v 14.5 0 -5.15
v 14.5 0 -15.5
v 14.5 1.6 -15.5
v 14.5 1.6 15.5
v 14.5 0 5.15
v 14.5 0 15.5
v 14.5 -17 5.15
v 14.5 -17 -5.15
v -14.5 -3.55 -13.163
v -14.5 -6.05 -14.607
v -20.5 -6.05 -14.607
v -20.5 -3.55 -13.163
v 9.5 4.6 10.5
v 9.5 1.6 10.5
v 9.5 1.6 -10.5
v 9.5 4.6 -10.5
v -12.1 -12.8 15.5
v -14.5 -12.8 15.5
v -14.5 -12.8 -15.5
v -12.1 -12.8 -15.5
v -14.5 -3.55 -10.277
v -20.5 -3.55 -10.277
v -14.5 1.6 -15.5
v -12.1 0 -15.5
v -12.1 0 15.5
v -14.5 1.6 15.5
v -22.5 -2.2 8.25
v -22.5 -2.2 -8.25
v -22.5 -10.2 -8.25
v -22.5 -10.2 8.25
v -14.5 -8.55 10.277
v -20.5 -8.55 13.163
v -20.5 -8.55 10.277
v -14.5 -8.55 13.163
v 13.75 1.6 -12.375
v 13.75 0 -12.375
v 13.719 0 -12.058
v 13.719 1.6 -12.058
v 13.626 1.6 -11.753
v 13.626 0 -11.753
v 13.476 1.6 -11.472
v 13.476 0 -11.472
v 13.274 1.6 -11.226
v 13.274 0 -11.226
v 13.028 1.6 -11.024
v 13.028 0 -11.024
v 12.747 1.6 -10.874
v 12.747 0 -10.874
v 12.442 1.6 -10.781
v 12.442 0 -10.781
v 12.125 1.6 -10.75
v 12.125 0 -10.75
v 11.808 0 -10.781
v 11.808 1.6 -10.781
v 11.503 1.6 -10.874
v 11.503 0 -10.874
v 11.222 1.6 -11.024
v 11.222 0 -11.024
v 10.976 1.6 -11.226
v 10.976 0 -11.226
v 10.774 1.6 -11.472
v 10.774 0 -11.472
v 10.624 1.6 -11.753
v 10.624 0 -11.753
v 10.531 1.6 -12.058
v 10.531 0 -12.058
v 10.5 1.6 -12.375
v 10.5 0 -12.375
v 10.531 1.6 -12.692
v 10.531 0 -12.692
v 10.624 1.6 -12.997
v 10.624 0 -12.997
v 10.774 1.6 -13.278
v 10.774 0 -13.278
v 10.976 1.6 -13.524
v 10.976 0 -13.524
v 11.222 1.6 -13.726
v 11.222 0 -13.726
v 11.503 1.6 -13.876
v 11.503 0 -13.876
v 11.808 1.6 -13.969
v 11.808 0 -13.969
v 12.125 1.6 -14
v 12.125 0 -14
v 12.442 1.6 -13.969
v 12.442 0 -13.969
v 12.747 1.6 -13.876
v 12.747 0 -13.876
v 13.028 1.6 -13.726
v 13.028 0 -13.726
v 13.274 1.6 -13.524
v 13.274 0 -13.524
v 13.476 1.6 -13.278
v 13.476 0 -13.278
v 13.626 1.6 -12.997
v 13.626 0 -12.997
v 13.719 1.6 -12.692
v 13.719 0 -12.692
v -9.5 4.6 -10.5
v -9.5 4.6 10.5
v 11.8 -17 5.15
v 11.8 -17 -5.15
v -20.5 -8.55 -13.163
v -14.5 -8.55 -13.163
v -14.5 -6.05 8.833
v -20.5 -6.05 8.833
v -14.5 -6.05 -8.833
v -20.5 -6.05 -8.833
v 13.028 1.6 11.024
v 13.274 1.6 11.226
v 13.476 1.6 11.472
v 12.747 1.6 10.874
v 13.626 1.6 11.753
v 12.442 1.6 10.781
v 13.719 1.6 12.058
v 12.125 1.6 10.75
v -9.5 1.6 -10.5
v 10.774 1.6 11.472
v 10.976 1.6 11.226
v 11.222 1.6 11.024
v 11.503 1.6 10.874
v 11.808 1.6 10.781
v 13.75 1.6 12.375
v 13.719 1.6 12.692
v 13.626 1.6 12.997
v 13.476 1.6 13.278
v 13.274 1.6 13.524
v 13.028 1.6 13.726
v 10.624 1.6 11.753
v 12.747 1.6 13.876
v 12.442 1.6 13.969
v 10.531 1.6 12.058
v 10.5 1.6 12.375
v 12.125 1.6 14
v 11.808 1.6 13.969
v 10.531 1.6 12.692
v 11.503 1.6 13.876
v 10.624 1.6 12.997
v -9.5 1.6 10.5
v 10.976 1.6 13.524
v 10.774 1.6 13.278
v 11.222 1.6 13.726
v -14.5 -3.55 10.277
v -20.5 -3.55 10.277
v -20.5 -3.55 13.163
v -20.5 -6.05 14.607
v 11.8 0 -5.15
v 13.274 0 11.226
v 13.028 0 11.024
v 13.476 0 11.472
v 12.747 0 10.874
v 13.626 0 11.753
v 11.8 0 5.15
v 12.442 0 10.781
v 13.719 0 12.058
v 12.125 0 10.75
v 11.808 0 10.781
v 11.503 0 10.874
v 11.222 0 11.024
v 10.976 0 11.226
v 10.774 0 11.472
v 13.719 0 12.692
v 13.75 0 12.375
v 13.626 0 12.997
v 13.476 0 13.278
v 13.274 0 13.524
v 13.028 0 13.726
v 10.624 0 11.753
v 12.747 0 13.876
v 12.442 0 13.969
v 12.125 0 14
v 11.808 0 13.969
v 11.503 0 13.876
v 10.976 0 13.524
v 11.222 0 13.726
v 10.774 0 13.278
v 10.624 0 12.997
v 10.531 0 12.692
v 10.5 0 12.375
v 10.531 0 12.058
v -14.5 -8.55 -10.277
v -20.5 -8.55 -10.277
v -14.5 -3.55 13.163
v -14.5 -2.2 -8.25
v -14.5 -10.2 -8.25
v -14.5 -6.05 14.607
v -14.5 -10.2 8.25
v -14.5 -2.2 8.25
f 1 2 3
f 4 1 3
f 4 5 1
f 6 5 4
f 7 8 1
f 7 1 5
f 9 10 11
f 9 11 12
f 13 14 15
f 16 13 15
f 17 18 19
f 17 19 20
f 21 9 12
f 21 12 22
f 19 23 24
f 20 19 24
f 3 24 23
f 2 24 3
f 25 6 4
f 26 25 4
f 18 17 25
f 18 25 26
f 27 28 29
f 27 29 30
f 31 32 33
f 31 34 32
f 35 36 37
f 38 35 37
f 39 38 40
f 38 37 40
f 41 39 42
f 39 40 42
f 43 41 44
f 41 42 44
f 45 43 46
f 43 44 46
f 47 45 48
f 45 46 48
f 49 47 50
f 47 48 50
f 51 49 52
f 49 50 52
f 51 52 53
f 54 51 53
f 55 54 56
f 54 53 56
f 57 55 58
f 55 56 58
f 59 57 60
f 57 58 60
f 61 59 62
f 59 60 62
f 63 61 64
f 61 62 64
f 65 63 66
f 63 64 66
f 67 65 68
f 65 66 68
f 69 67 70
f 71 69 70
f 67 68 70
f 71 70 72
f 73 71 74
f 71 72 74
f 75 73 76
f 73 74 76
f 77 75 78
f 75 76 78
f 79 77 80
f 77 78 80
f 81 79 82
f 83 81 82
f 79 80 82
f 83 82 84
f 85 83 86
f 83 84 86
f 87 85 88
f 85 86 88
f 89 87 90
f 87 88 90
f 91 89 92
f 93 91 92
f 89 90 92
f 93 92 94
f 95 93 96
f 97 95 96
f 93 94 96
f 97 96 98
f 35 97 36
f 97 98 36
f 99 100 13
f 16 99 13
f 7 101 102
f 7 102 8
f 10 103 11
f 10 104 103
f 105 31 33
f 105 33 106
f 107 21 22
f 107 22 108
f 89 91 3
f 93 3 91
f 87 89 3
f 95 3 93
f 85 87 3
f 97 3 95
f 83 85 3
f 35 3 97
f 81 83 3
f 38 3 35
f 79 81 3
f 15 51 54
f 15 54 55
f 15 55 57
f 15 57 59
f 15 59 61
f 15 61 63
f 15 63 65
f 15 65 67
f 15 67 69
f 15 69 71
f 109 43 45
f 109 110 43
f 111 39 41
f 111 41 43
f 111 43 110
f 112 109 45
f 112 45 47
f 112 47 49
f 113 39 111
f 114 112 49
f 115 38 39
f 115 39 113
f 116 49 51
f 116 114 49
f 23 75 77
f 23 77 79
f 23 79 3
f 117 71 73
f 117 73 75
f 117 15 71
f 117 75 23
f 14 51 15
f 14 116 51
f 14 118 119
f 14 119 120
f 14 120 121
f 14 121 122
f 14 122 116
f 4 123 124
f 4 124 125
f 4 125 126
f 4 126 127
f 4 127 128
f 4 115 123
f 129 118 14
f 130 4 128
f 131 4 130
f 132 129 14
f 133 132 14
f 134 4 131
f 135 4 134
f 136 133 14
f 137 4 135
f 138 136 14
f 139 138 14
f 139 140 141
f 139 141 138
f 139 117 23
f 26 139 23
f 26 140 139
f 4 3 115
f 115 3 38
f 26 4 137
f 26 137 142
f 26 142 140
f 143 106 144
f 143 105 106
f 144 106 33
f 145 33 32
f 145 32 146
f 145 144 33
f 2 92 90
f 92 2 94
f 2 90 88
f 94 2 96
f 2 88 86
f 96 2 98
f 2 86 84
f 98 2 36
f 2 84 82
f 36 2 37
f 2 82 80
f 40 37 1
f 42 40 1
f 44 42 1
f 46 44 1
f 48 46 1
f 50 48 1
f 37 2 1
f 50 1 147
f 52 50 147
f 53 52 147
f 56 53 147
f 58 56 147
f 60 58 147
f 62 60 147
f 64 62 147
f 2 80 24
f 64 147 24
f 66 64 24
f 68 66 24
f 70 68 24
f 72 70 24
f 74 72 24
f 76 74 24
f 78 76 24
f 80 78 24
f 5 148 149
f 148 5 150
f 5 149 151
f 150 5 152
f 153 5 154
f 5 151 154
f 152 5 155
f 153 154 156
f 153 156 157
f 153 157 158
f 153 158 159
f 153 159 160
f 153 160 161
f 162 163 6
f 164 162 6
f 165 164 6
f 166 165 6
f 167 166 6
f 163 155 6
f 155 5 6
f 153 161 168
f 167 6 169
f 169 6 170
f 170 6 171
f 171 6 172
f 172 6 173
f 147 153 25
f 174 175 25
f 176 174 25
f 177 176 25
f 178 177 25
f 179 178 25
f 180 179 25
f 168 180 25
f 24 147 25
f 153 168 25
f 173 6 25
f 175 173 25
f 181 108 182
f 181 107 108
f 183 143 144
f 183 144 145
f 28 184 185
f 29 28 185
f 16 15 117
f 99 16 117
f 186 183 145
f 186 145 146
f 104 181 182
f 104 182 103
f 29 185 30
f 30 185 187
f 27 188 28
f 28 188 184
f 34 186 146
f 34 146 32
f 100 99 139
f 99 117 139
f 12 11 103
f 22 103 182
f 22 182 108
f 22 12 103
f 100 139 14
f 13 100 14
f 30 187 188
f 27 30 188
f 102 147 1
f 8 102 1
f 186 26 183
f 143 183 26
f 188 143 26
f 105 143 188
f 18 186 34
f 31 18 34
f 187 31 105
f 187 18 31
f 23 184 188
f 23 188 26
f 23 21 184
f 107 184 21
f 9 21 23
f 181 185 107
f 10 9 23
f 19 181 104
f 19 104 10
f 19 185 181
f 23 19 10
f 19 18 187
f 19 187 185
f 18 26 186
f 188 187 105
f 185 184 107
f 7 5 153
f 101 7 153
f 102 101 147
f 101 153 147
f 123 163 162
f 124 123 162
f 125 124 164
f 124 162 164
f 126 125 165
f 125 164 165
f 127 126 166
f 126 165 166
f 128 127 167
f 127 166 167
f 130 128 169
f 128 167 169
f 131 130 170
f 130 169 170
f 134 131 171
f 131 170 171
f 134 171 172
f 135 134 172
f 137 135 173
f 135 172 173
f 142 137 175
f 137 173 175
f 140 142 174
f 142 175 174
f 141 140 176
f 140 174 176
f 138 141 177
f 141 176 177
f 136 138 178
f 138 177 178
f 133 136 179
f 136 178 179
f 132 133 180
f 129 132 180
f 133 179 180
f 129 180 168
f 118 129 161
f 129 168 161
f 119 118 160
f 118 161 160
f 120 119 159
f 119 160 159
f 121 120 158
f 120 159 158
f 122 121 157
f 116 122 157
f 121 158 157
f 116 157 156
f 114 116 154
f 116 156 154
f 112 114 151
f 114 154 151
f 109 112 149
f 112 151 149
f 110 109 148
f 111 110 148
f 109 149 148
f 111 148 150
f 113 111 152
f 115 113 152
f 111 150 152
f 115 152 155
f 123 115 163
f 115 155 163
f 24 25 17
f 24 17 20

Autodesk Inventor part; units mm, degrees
ref_plane "YZ Plane" through (0, 0, 0) normal (1, 0, 0) x (0, 1, 0)
ref_plane "XZ Plane" through (0, 0, 0) normal (0, 1, 0) x (-1, 0, 0)
ref_plane "XY Plane" through (0, 0, 0) normal (0, 0, 1) x (1, 0, 0)
sketch "Sketch1" plane through (0, 0, 0) normal (0, 1, 0) x (-1, 0, 0)
  line L0 (14.5, -15.5) -> (-14.5, -15.5)
  line L1 (-14.5, -15.5) -> (-14.5, 15.5)
  line L2 (-14.5, 15.5) -> (14.5, 15.5)
  line L3 (14.5, 15.5) -> (14.5, -15.5)
  line L4 (14.5, -15.5) -> (-14.5, 15.5) construction
  line L5 (-14.5, -15.5) -> (14.5, 15.5) construction
  point P0 (0, 0)
  dimension "d0" = 29
  dimension "d1" = 31
extrude "Extrusion1" add sketch "Sketch1" along normal blind 1.6
sketch "Sketch2" plane through (0, 0, 0) normal (0, -1, 0) x (1, 0, 0)
  line L0 (-14.5, 15.5) -> (-12.1, 15.5)
  line L1 (-12.1, 15.5) -> (-12.1, -15.5)
  line L2 (-12.1, -15.5) -> (-14.5, -15.5)
  line L3 (-14.5, -15.5) -> (-14.5, 15.5)
  point P0 (0, 0)
  dimension "d4" = 2.4
extrude "Extrusion2" add sketch "Sketch2" along normal blind 12.8
sketch "Sketch3" plane through (0, 0, 0) normal (0, -1, 0) x (1, 0, 0)
  line L0 (-14.5, 15.5) -> (14.5, 15.5) construction
  line L1 (12.125, 15.5) -> (12.125, -15.5904) construction
  line L2 (14.5, -15.5) -> (14.5, 15.5) construction
  line L3 (12.125, 12.375) -> (14.5, 12.375) construction
  line L4 (12.125, -12.375) -> (14.5, -12.375) construction
  line L5 (-12.1, -15.5) -> (14.5, -15.5) construction
  circle A0 centre (12.125, 12.375) radius 1.625
  circle A1 centre (12.125, -12.375) radius 1.625
  point P0 (0, 0)
  dimension "d7" = 2.375
  dimension "d8" = 3.125
  dimension "d9" = 3.125
  dimension "d10" = 3.25
extrude "Extrusion3" cut sketch "Sketch3" against normal through all
sketch "Sketch4" plane through (-14.5, 1.6, -15.5) normal (-1, 0, 0) x (0, 0, 1)
  line L0 (30.9539, -7.65) -> (0, -7.65) construction
  line L1 (0, -14.4) -> (0, 0) construction
  line L2 (0, 0) -> (31, 0) construction
  line L3 (24.3332, -7.65) -> (25.7766, -5.15)
  line L4 (25.7766, -5.15) -> (28.6634, -5.15)
  line L5 (28.6634, -5.15) -> (30.1068, -7.65)
  line L6 (30.1068, -7.65) -> (28.6634, -10.15)
  line L7 (28.6634, -10.15) -> (25.7766, -10.15)
  line L8 (25.7766, -10.15) -> (24.3332, -7.65)
  line L9 (2.3366, -10.15) -> (0.8932, -7.65)
  line L10 (0.8932, -7.65) -> (2.3366, -5.15)
  line L11 (2.3366, -5.15) -> (5.2234, -5.15)
  line L12 (5.2234, -5.15) -> (6.6668, -7.65)
  line L13 (6.6668, -7.65) -> (5.2234, -10.15)
  line L14 (5.2234, -10.15) -> (2.3366, -10.15)
  line L15 (31, 0) -> (31, -14.4) projected
  point P0 (15.5, -1.6)
  point P1 (27.22, -7.65)
  point P2 (3.78, -7.65)
  dimension "d13" = 7.65
  dimension "d14" = 5
  dimension "d15" = 3.78
  dimension "d16" = 3.78
extrude "Extrusion4" add sketch "Sketch4" along normal blind 6
sketch "Sketch5" plane through (-14.5, 1.6, -15.5) normal (-1, 0, 0) x (0, 0, 1)
  line L0 (0, 0) -> (31, 0) construction
  line L1 (15.5, 0) -> (15.5, -14.4) construction
  line L2 (31, -14.4) -> (0, -14.4) construction
  line L3 (23.75, -3.8) -> (7.25, -3.8)
  line L4 (7.25, -3.8) -> (7.25, -11.8)
  line L5 (7.25, -11.8) -> (23.75, -11.8)
  line L6 (23.75, -11.8) -> (23.75, -3.8)
  line L7 (23.75, -3.8) -> (7.25, -11.8) construction
  line L8 (7.25, -3.8) -> (23.75, -11.8) construction
  point P0 (15.5, -1.6)
  point P1 (15.5, -7.8)
  dimension "d19" = 3.8
  dimension "d20" = 8
  dimension "d21" = 16.5
extrude "Extrusion5" add sketch "Sketch5" along normal blind 8
sketch "Sketch6" plane through (0, 1.6, 0) normal (0, 1, 0) x (1, 0, 0)
  line L0 (9.5, -10.5) -> (9.5, 10.5)
  line L1 (9.5, 10.5) -> (-9.5, 10.5)
  line L2 (-9.5, 10.5) -> (-9.5, -10.5)
  line L3 (-9.5, -10.5) -> (9.5, -10.5)
  line L4 (9.5, -10.5) -> (-9.5, 10.5) construction
  line L5 (9.5, 10.5) -> (-9.5, -10.5) construction
  line L6 (14.5, -15.5) -> (14.5, 15.5) projected
  line L7 (-14.5, -15.5) -> (14.5, -15.5) projected
  point P0 (0, 0)
  dimension "d24" = 5
  dimension "d25" = 5
extrude "Extrusion6" add sketch "Sketch6" along normal blind 3
sketch "Sketch7" plane through (0, 0, 0) normal (0, -1, 0) x (1, 0, 0)
  line L0 (-12.1, 15.5) -> (-12.1, -15.5) construction
  line L1 (-12.1, 0) -> (14.5, 0) construction
  line L2 (14.5, 15.5) -> (14.5, -15.5) construction
  line L3 (14.5, -5.15) -> (14.5, 5.15)
  line L4 (14.5, 5.15) -> (11.8, 5.15)
  line L5 (11.8, 5.15) -> (11.8, -5.15)
  line L6 (11.8, -5.15) -> (14.5, -5.15)
  line L7 (14.5, -5.15) -> (11.8, 5.15) construction
  line L8 (14.5, 5.15) -> (11.8, -5.15) construction
  point P0 (0, 0)
  point P1 (13.15, 0)
  dimension "d28" = 10.3
  dimension "d29" = 2.7
  dimension "d30" = 0
extrude "Extrusion7" add sketch "Sketch7" along normal blind 17
properties part number "RS 232 Board"
